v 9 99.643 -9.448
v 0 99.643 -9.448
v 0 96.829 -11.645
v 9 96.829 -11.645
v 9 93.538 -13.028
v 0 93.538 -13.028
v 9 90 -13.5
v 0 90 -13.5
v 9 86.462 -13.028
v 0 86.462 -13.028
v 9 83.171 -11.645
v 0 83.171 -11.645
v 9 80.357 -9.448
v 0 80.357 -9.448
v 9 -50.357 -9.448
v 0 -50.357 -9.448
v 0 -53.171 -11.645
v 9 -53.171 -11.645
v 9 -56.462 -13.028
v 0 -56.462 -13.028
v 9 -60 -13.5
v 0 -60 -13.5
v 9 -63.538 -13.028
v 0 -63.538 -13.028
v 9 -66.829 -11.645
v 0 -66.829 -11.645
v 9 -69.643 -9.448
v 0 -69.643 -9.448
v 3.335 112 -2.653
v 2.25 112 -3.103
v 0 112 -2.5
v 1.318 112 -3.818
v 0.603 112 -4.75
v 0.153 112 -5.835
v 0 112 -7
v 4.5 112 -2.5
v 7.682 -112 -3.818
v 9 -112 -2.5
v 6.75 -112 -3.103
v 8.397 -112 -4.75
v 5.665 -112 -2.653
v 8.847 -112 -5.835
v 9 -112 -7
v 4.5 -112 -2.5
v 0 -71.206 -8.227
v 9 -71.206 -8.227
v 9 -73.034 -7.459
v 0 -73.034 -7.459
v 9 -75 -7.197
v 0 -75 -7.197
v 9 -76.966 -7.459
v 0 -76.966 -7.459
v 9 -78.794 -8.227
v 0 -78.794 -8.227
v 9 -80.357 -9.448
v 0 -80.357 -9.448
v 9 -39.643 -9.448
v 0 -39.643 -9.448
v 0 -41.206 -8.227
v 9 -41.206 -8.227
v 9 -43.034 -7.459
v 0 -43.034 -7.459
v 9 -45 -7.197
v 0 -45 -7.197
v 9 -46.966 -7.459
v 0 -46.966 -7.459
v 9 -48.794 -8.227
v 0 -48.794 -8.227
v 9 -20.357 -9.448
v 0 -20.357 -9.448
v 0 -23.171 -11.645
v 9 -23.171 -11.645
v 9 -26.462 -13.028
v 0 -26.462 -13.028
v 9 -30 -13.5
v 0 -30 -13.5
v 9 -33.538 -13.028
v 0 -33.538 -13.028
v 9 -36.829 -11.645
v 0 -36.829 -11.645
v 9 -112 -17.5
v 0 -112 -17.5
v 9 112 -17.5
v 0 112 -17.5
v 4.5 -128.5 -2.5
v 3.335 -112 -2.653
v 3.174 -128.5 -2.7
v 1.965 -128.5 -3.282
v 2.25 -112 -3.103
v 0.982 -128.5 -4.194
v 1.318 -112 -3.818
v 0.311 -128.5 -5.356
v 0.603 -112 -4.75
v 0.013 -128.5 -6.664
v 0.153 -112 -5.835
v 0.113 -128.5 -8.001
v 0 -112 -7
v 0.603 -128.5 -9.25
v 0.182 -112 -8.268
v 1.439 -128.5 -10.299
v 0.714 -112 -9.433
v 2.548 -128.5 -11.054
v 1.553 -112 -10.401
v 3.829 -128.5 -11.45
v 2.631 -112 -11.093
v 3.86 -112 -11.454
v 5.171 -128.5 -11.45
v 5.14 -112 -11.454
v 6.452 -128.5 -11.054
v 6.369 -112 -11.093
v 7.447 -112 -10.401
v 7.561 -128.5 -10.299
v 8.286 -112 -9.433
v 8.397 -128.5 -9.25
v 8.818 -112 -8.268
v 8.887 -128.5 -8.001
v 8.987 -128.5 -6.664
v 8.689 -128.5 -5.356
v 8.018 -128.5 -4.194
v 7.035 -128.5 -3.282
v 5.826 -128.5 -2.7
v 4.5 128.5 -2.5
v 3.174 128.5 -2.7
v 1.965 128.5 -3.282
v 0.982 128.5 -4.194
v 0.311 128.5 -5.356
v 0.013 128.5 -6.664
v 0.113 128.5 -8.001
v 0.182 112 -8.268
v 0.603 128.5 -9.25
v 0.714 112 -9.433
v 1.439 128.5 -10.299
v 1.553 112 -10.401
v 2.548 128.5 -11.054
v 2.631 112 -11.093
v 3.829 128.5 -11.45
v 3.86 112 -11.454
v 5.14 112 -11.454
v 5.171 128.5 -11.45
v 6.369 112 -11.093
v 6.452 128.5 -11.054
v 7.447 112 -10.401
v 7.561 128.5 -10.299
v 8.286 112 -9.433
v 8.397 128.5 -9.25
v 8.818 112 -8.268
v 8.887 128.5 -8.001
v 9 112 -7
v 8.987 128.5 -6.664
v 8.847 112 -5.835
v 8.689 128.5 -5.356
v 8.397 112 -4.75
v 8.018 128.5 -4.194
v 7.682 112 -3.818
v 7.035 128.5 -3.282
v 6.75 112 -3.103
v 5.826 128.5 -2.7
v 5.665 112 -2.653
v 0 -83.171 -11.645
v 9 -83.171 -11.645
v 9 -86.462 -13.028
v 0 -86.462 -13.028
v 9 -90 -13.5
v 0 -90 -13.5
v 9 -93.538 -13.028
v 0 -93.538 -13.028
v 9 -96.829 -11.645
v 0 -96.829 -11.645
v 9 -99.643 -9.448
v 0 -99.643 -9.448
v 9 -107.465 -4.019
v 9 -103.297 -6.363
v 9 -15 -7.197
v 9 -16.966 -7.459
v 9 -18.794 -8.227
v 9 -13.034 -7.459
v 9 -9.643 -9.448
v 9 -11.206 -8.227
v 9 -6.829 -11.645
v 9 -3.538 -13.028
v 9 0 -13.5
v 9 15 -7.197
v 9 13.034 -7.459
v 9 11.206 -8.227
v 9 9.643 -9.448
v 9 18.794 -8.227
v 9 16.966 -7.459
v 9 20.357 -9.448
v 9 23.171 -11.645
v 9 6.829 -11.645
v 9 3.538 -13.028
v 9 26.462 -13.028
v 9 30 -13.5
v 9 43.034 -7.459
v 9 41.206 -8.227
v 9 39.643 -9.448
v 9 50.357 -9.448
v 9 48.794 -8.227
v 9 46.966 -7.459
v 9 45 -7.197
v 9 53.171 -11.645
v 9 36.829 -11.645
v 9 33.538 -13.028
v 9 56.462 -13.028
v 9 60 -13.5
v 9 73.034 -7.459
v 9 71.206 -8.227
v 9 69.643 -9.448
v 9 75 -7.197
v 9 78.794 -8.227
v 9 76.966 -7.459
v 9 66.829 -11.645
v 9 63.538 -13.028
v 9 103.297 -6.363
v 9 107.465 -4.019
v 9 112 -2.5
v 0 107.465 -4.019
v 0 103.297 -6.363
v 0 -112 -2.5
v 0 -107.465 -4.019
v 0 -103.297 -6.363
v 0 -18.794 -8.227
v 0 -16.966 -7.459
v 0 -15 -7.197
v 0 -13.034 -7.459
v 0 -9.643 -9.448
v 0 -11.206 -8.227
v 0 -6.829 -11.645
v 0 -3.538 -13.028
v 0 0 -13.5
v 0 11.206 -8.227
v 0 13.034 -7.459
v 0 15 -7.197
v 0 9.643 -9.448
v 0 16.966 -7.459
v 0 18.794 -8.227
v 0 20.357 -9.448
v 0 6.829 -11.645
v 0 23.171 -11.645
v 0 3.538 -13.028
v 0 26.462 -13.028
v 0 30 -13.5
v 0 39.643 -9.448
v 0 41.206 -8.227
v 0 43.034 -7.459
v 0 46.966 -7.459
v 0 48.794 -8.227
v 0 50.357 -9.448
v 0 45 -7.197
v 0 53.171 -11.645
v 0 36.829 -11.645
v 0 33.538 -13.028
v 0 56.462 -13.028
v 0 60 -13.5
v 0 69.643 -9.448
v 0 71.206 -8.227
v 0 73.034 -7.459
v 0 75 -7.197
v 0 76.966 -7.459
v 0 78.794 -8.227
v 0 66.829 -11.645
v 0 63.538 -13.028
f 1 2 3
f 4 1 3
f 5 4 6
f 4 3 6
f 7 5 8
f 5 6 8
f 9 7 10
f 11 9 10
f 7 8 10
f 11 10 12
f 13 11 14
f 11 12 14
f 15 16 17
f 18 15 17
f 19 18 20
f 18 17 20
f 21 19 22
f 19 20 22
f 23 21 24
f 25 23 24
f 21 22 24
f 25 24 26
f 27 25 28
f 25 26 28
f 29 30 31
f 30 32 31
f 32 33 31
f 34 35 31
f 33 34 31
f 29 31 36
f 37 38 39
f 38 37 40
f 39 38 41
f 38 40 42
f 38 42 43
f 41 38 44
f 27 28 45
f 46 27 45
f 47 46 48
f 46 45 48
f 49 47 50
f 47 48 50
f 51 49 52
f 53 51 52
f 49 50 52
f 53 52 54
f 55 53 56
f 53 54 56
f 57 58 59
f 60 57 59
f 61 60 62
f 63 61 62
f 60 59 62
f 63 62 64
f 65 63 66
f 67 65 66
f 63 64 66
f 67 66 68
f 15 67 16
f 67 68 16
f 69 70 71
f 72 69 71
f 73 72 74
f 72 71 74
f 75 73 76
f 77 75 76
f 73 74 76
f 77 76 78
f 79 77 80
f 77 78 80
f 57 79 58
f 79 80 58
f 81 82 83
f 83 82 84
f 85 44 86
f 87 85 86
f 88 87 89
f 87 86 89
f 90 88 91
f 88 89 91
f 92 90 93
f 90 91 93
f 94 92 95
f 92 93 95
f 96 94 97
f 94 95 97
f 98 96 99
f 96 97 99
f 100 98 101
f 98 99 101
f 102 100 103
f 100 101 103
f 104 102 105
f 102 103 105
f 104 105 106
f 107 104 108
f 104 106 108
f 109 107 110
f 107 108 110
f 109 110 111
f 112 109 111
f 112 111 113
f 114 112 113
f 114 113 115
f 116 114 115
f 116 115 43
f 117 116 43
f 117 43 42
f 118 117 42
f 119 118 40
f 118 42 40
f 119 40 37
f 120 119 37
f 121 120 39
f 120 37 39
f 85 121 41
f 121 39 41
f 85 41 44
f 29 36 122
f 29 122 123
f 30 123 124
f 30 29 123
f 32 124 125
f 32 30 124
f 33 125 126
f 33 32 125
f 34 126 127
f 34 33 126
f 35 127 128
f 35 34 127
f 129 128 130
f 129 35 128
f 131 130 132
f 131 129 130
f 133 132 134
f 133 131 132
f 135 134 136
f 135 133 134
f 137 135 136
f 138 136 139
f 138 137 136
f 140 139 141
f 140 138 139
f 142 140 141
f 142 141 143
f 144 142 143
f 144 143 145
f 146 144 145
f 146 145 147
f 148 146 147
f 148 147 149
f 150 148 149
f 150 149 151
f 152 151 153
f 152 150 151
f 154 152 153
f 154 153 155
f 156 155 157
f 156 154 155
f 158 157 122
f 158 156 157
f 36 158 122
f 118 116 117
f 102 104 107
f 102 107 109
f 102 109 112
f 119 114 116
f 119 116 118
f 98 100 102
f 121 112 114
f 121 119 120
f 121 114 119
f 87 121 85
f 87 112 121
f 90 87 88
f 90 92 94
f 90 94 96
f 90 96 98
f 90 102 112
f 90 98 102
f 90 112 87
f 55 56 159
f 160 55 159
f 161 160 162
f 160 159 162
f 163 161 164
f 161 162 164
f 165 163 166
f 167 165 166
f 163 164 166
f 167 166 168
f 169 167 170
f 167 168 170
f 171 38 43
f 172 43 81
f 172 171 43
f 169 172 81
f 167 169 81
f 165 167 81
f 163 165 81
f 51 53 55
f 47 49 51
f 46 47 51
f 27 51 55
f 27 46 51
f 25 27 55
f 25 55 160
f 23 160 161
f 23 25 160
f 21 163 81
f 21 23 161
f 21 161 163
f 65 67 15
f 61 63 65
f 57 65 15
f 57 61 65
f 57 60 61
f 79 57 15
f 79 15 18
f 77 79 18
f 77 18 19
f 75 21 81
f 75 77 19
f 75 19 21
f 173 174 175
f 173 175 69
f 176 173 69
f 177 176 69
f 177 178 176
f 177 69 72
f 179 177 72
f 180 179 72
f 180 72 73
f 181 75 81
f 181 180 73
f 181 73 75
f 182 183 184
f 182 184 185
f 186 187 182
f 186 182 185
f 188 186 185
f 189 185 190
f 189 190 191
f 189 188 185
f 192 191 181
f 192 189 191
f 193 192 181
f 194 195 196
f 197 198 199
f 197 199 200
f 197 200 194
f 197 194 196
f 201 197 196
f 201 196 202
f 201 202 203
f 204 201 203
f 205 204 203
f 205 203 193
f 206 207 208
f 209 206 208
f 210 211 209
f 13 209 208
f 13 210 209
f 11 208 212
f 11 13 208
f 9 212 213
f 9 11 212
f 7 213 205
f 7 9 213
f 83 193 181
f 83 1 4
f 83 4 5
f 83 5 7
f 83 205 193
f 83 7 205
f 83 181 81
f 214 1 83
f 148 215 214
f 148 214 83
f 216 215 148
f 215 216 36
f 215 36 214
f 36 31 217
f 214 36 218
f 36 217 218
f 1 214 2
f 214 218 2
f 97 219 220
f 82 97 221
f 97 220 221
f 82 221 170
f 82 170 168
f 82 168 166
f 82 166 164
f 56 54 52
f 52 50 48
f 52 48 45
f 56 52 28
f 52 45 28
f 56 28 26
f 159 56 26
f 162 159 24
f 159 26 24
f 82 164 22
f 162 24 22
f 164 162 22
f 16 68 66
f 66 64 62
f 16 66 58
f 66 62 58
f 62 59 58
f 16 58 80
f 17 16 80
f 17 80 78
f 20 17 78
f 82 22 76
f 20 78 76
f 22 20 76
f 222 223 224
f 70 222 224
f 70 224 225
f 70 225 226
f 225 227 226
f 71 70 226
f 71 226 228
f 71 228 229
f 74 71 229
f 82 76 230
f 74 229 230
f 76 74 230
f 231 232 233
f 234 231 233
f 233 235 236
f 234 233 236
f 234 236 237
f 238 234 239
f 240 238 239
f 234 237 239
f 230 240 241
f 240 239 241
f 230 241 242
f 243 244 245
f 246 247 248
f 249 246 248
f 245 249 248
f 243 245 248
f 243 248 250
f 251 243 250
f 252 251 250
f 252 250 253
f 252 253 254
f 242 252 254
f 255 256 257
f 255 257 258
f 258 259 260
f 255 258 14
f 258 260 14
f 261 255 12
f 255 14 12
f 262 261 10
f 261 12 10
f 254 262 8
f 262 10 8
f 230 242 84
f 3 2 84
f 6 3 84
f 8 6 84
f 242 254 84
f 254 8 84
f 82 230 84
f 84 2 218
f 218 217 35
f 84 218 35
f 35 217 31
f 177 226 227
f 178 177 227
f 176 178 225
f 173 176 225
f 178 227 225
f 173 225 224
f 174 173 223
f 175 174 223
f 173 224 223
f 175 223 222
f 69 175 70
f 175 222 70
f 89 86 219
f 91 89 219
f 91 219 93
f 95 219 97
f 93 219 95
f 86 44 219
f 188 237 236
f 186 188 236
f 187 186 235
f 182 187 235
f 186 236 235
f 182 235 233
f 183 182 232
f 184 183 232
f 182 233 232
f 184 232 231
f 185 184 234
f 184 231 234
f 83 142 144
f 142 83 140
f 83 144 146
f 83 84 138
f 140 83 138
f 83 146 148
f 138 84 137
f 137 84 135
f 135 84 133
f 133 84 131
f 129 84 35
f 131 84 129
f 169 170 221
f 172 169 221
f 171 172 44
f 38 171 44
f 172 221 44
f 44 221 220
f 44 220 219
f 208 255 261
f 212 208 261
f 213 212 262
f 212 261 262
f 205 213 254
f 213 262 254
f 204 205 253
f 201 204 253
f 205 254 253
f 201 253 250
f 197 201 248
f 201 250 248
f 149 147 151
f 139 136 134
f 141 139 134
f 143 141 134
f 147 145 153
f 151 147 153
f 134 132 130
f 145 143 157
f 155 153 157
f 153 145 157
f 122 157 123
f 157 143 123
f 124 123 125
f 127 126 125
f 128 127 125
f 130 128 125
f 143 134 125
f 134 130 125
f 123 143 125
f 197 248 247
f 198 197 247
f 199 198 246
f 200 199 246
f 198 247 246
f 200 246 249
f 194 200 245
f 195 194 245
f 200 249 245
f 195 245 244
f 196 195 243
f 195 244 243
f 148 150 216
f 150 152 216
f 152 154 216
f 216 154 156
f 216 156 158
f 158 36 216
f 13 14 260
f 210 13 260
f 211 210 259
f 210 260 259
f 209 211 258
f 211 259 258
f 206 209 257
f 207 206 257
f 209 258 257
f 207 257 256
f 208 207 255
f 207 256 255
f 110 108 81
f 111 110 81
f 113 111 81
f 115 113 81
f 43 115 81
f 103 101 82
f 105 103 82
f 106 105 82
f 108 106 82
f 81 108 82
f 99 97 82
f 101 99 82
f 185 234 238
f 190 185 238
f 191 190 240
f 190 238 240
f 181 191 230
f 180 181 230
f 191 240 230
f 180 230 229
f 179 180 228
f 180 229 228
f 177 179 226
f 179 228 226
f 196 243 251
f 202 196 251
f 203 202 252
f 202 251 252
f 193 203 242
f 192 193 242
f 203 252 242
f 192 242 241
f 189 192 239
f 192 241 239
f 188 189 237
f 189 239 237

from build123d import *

# Parameters (mm, degrees)
BOSS_EXTRUDE1_DEPTH = 9
SKETCH2_R           = 4.5
BOSS_EXTRUDE2_DEPTH = 16.5


with BuildPart() as part:
    # Sketch1 → Boss-Extrude1 (new body)
    with BuildSketch(Plane.YZ):
        with BuildLine():
            Line((-112, -2.5), (-112, -17.5))
            Line((-112, -17.5), (112, -17.5))
            Line((112, -17.5), (112, -2.5))
            ThreePointArc((112, -2.5), (105.325857912, -5.092638652), (99.642857143, -9.448031865))
            ThreePointArc((99.642857143, -9.448031865), (90, -13.5), (80.357142857, -9.448031865))
            ThreePointArc((80.357142857, -9.448031865), (75, -7.196938457), (69.642857143, -9.448031865))
            ThreePointArc((69.642857143, -9.448031865), (60, -13.5), (50.357142857, -9.448031865))
            ThreePointArc((50.357142857, -9.448031865), (45, -7.196938457), (39.642857143, -9.448031865))
            ThreePointArc((39.642857143, -9.448031865), (30, -13.5), (20.357142857, -9.448031865))
            ThreePointArc((20.357142857, -9.448031865), (15, -7.196938457), (9.642857143, -9.448031865))
            ThreePointArc((9.642857143, -9.448031865), (0, -13.5), (-9.642857143, -9.448031865))
            ThreePointArc((-9.642857143, -9.448031865), (-15, -7.196938457), (-20.357142857, -9.448031865))
            ThreePointArc((-20.357142857, -9.448031865), (-30, -13.5), (-39.642857143, -9.448031865))
            ThreePointArc((-39.642857143, -9.448031865), (-45, -7.196938457), (-50.357142857, -9.448031865))
            ThreePointArc((-50.357142857, -9.448031865), (-60, -13.5), (-69.642857143, -9.448031865))
            ThreePointArc((-69.642857143, -9.448031865), (-75, -7.196938457), (-80.357142857, -9.448031865))
            ThreePointArc((-80.357142857, -9.448031865), (-90, -13.5), (-99.642857143, -9.448031865))
            ThreePointArc((-99.642857143, -9.448031865), (-105.325857912, -5.092638652), (-112, -2.5))
        make_face()
    extrude(amount=BOSS_EXTRUDE1_DEPTH)

    # Sketch2 → Boss-Extrude2 (add)
    with BuildSketch(Plane.XZ.offset(112)):
        with Locations(Location((4.5, -7, 0), (0, 0, 90))):
            Circle(SKETCH2_R)
    boss_extrude2 = extrude(amount=BOSS_EXTRUDE2_DEPTH)

    # Mirror1: Boss-Extrude2 across plane
    add(boss_extrude2.mirror(Plane.ZX))


solid = part.part
